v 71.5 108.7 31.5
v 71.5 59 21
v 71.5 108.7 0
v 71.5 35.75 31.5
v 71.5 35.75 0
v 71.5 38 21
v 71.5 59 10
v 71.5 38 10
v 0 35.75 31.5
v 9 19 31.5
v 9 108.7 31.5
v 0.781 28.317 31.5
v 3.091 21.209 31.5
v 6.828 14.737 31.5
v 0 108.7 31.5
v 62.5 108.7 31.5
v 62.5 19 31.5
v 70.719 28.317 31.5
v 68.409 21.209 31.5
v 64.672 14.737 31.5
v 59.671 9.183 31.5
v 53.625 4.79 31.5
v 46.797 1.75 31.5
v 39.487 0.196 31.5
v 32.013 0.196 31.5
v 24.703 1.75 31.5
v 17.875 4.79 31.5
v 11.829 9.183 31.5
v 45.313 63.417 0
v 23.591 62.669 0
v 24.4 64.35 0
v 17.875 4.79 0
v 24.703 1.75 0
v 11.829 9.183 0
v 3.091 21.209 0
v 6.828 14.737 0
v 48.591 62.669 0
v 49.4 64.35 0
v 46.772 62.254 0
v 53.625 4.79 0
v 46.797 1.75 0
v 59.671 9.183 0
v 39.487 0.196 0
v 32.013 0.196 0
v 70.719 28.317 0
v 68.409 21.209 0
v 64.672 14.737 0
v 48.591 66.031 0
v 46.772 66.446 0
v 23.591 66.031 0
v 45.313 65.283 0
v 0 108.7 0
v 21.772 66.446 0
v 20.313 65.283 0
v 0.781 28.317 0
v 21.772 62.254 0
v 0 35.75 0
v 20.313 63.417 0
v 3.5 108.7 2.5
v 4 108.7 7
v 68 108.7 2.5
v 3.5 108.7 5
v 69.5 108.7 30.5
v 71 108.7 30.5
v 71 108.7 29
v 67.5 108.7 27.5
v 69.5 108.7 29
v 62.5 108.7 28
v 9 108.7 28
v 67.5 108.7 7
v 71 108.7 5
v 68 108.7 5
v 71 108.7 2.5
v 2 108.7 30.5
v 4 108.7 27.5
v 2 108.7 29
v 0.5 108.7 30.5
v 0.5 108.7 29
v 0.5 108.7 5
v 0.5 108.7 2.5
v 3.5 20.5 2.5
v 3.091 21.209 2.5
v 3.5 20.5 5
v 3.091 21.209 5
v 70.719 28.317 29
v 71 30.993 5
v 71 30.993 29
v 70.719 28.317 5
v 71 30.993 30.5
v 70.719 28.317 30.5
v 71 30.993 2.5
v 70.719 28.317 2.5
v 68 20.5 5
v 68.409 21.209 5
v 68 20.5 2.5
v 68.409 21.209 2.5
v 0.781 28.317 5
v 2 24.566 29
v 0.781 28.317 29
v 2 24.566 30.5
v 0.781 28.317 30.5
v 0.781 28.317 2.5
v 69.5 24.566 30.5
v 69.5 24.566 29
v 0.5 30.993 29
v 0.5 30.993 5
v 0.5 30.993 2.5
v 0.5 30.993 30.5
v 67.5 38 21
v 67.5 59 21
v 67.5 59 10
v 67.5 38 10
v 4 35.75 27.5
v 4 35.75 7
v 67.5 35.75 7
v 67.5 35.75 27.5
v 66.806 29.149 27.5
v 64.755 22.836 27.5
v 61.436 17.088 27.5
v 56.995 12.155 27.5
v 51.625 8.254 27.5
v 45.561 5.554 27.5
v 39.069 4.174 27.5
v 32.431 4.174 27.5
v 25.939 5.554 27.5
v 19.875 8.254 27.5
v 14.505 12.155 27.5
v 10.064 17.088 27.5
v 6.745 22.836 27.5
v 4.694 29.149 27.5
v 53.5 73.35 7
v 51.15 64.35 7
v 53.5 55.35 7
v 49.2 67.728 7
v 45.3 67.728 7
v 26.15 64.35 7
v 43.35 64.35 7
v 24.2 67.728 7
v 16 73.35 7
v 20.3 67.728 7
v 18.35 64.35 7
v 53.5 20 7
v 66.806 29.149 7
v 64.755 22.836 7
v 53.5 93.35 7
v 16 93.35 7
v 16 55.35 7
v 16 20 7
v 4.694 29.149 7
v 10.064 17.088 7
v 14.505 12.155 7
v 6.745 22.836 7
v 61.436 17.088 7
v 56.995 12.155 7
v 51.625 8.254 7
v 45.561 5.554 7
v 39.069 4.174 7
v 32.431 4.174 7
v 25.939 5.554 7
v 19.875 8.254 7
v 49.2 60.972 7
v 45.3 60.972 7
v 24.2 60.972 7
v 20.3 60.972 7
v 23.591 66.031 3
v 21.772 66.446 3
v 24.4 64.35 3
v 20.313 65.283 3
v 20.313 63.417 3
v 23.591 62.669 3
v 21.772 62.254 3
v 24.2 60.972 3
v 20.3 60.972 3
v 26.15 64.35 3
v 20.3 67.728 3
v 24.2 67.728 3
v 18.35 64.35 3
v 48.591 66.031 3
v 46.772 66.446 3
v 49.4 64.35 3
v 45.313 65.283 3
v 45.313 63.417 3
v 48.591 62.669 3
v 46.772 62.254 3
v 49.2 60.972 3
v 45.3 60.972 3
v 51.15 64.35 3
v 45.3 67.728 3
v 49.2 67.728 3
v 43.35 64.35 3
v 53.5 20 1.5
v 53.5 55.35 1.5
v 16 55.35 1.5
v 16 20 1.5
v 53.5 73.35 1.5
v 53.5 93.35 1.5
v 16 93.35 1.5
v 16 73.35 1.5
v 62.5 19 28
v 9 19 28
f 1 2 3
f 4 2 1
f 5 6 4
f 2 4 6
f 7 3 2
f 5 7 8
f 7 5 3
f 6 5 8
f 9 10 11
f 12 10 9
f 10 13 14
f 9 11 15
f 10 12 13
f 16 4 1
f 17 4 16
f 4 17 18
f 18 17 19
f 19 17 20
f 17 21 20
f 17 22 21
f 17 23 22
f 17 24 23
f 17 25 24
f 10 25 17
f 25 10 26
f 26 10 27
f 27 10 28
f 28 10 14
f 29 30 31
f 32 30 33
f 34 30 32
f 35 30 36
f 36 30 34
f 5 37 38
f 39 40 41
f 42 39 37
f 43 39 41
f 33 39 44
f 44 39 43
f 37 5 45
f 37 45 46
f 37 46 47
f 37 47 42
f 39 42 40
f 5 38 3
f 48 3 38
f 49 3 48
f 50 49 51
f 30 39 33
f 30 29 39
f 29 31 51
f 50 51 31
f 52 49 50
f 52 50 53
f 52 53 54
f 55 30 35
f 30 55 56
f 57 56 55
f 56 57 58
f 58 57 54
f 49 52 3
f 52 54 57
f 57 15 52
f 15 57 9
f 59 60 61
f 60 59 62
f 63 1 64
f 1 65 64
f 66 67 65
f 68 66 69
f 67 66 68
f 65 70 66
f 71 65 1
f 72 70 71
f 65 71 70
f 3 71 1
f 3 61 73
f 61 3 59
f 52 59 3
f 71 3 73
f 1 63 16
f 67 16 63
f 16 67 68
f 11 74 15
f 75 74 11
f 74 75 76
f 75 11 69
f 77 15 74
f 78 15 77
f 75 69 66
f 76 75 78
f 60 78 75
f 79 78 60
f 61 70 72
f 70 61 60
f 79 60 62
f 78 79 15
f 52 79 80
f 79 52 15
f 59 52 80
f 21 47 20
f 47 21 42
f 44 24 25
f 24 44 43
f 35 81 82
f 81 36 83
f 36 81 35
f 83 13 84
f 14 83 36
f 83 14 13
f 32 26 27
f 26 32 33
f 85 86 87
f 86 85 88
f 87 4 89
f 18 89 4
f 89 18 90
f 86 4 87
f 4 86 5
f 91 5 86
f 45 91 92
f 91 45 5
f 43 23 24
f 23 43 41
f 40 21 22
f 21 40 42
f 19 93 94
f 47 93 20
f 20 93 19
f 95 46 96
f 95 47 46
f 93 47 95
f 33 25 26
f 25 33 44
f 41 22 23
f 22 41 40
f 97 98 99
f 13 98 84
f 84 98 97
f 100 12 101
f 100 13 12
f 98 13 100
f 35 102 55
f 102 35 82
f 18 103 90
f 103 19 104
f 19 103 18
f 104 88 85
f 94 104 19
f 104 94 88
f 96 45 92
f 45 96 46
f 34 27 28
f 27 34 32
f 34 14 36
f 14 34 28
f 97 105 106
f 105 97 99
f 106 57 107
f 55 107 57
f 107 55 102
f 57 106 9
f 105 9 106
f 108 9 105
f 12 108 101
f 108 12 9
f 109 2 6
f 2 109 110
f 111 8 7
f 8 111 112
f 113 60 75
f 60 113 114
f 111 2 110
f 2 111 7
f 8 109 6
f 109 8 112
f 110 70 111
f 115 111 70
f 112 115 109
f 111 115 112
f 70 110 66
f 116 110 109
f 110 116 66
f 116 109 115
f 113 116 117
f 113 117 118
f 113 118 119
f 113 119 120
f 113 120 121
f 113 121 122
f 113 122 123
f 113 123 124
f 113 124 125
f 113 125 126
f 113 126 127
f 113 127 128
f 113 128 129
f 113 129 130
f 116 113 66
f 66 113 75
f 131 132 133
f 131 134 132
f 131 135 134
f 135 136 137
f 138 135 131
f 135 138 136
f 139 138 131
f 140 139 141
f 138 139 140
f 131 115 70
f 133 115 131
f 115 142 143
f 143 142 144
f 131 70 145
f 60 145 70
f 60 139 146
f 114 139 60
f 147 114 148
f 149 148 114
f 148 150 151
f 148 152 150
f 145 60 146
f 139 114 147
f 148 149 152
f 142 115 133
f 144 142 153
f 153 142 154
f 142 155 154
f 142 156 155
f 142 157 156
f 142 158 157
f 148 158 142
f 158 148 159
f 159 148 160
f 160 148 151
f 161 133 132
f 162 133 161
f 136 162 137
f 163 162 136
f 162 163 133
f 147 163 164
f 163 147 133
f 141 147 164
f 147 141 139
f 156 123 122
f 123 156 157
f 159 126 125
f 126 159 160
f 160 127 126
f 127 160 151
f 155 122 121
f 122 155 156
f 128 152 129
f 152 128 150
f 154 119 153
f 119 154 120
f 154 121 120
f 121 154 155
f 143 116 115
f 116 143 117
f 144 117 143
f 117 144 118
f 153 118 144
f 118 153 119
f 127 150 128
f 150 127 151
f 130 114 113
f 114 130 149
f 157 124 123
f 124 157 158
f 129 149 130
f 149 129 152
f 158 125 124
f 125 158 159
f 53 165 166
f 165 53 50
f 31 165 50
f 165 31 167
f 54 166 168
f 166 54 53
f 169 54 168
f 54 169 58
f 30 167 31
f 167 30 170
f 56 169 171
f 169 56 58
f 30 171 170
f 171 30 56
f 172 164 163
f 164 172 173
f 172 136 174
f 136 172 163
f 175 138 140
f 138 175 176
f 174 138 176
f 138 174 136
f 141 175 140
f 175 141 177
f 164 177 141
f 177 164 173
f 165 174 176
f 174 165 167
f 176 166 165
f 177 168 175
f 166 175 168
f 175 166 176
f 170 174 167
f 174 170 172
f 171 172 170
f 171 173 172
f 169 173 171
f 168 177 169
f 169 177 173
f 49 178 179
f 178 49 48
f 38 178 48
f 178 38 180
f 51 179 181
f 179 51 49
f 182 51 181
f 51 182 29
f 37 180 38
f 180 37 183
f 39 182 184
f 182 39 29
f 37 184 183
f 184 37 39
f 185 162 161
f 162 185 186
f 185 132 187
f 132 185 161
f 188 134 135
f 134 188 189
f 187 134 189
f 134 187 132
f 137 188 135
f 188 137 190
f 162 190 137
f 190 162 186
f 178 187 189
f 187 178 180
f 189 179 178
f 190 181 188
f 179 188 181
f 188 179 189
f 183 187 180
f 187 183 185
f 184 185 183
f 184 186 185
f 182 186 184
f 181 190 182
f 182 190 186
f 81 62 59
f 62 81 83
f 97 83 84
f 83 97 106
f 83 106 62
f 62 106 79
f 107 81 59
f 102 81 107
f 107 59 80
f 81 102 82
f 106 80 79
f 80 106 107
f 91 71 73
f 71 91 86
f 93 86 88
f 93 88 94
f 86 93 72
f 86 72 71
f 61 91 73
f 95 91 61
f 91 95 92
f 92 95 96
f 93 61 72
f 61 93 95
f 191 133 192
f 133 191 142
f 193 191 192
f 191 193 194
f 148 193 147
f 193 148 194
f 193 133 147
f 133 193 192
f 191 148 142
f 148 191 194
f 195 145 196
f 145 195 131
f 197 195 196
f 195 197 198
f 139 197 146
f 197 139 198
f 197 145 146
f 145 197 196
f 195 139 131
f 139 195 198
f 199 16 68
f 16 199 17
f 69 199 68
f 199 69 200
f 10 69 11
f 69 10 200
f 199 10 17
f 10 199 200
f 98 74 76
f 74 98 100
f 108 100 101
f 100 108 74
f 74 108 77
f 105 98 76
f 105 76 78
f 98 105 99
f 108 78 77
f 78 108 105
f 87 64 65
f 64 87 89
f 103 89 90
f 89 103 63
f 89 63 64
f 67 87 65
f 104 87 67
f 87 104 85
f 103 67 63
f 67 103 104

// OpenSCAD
/* freerunner bicycle holder. screw it on the lower half of a bell */

freerunner_width=62+1.5;
freerunner_height=120.7;
freerunner_thickness=18.5+1+1;

m4_hole_r=4.3/2;
m4_nut_r=7.8/2;
module freerunner_eckig() {
  cube([freerunner_width,freerunner_height,freerunner_thickness]);
//  translate(v=[10,10,5])
//  minkowski() 
//  {
//   cube([freerunner_width-20,freerunner_height-20,freerunner_thickness-10]);
//    scale([1,1,0.5]) sphere(r=10);
//  }
}

module freerunner_rund() {
  union() {
  /* hole for usb */
  translate(v=[0,34,3]) cube([freerunner_width+20,21,11]);  
  translate(v=[0,freerunner_width/2,0])
  cube([freerunner_width,freerunner_height-freerunner_width/2,freerunner_thickness]);
  translate(v=[freerunner_width/2,freerunner_width/2,0])
  cylinder(r=freerunner_width/2,h=freerunner_thickness);
}
}

module freerunner_holder() {

difference() {
  //cube([freerunner_width+8,freerunner_height-20+8,freerunner_thickness+10]);
  union() {

  translate(v=[0,(freerunner_width+8)/2,0])
    cube([freerunner_width+8,freerunner_height-20+8-(freerunner_width+8)/2,freerunner_thickness+11]);
  translate(v=[(freerunner_width+8)/2,(freerunner_width+8)/2,0])
    cylinder(r=(freerunner_width+8)/2,h=freerunner_thickness+11);
  
}
  
  translate(v=[4,4,7])
  freerunner_rund();
  //cube(size=[freerunner_width,freerunner_height,freerunner_thickness]);
  /* lower slot */
  translate(v=[0.5,0,2.5])
  cube(size=[3,freerunner_height,2.5]);
 /* lower slot */
 translate(v=[freerunner_width+8-3-0.5,0,2.5])
  cube(size=[3,freerunner_height,2.5]);
 /* unneeded material */
  translate(v=[16,20,1.5]) 
   cube(size=[freerunner_width-26,freerunner_height/2-25,10]);
 /* unneeded material */
 translate(v=[16,13+freerunner_height/2,1.5]) 
   cube(size=[freerunner_width-26,20,10]);
 /* display opening, leave a thin layer for easier printing */
  translate(v=[4+5,4+15,7+freerunner_thickness+0.5]) cube(size=[freerunner_width-10,freerunner_height-15,freerunner_thickness+10]);
 /* upper slot */ 
 translate(v=[0.5,0,freerunner_thickness+7+1.5])
  cube(size=[1.5,freerunner_height,1.5]);
 /* upper slot */
translate(v=[freerunner_width+8-0.5-1.5,0,freerunner_thickness+7+1.5])
  cube(size=[1.5,freerunner_height,1.5]);

  /* screwholes */
  translate(v=[freerunner_width/2+3,freerunner_height/2+4,0]) {
     translate(v=[-25/2,0,0]) {
        cylinder(r=m4_hole_r,h=20);
        translate(v=[0,0,3]) cylinder(r=m4_nut_r,$fn=6,h=5);
     }
      translate(v=[25/2,0,0]) {
        cylinder(r=m4_hole_r,h=20);
         translate(v=[0,0,3]) cylinder(r=m4_nut_r,$fn=6,h=5);
       
        //translate(v=[-1,-3.5,-8])  cube([3,7,20]); 
     }
  } 
}
}


/*projection() intersection () {
 translate(v=[-20,-20,10]) cube([200,200,0.5]);
freerunner_holder();
}
*/


freerunner_holder();
